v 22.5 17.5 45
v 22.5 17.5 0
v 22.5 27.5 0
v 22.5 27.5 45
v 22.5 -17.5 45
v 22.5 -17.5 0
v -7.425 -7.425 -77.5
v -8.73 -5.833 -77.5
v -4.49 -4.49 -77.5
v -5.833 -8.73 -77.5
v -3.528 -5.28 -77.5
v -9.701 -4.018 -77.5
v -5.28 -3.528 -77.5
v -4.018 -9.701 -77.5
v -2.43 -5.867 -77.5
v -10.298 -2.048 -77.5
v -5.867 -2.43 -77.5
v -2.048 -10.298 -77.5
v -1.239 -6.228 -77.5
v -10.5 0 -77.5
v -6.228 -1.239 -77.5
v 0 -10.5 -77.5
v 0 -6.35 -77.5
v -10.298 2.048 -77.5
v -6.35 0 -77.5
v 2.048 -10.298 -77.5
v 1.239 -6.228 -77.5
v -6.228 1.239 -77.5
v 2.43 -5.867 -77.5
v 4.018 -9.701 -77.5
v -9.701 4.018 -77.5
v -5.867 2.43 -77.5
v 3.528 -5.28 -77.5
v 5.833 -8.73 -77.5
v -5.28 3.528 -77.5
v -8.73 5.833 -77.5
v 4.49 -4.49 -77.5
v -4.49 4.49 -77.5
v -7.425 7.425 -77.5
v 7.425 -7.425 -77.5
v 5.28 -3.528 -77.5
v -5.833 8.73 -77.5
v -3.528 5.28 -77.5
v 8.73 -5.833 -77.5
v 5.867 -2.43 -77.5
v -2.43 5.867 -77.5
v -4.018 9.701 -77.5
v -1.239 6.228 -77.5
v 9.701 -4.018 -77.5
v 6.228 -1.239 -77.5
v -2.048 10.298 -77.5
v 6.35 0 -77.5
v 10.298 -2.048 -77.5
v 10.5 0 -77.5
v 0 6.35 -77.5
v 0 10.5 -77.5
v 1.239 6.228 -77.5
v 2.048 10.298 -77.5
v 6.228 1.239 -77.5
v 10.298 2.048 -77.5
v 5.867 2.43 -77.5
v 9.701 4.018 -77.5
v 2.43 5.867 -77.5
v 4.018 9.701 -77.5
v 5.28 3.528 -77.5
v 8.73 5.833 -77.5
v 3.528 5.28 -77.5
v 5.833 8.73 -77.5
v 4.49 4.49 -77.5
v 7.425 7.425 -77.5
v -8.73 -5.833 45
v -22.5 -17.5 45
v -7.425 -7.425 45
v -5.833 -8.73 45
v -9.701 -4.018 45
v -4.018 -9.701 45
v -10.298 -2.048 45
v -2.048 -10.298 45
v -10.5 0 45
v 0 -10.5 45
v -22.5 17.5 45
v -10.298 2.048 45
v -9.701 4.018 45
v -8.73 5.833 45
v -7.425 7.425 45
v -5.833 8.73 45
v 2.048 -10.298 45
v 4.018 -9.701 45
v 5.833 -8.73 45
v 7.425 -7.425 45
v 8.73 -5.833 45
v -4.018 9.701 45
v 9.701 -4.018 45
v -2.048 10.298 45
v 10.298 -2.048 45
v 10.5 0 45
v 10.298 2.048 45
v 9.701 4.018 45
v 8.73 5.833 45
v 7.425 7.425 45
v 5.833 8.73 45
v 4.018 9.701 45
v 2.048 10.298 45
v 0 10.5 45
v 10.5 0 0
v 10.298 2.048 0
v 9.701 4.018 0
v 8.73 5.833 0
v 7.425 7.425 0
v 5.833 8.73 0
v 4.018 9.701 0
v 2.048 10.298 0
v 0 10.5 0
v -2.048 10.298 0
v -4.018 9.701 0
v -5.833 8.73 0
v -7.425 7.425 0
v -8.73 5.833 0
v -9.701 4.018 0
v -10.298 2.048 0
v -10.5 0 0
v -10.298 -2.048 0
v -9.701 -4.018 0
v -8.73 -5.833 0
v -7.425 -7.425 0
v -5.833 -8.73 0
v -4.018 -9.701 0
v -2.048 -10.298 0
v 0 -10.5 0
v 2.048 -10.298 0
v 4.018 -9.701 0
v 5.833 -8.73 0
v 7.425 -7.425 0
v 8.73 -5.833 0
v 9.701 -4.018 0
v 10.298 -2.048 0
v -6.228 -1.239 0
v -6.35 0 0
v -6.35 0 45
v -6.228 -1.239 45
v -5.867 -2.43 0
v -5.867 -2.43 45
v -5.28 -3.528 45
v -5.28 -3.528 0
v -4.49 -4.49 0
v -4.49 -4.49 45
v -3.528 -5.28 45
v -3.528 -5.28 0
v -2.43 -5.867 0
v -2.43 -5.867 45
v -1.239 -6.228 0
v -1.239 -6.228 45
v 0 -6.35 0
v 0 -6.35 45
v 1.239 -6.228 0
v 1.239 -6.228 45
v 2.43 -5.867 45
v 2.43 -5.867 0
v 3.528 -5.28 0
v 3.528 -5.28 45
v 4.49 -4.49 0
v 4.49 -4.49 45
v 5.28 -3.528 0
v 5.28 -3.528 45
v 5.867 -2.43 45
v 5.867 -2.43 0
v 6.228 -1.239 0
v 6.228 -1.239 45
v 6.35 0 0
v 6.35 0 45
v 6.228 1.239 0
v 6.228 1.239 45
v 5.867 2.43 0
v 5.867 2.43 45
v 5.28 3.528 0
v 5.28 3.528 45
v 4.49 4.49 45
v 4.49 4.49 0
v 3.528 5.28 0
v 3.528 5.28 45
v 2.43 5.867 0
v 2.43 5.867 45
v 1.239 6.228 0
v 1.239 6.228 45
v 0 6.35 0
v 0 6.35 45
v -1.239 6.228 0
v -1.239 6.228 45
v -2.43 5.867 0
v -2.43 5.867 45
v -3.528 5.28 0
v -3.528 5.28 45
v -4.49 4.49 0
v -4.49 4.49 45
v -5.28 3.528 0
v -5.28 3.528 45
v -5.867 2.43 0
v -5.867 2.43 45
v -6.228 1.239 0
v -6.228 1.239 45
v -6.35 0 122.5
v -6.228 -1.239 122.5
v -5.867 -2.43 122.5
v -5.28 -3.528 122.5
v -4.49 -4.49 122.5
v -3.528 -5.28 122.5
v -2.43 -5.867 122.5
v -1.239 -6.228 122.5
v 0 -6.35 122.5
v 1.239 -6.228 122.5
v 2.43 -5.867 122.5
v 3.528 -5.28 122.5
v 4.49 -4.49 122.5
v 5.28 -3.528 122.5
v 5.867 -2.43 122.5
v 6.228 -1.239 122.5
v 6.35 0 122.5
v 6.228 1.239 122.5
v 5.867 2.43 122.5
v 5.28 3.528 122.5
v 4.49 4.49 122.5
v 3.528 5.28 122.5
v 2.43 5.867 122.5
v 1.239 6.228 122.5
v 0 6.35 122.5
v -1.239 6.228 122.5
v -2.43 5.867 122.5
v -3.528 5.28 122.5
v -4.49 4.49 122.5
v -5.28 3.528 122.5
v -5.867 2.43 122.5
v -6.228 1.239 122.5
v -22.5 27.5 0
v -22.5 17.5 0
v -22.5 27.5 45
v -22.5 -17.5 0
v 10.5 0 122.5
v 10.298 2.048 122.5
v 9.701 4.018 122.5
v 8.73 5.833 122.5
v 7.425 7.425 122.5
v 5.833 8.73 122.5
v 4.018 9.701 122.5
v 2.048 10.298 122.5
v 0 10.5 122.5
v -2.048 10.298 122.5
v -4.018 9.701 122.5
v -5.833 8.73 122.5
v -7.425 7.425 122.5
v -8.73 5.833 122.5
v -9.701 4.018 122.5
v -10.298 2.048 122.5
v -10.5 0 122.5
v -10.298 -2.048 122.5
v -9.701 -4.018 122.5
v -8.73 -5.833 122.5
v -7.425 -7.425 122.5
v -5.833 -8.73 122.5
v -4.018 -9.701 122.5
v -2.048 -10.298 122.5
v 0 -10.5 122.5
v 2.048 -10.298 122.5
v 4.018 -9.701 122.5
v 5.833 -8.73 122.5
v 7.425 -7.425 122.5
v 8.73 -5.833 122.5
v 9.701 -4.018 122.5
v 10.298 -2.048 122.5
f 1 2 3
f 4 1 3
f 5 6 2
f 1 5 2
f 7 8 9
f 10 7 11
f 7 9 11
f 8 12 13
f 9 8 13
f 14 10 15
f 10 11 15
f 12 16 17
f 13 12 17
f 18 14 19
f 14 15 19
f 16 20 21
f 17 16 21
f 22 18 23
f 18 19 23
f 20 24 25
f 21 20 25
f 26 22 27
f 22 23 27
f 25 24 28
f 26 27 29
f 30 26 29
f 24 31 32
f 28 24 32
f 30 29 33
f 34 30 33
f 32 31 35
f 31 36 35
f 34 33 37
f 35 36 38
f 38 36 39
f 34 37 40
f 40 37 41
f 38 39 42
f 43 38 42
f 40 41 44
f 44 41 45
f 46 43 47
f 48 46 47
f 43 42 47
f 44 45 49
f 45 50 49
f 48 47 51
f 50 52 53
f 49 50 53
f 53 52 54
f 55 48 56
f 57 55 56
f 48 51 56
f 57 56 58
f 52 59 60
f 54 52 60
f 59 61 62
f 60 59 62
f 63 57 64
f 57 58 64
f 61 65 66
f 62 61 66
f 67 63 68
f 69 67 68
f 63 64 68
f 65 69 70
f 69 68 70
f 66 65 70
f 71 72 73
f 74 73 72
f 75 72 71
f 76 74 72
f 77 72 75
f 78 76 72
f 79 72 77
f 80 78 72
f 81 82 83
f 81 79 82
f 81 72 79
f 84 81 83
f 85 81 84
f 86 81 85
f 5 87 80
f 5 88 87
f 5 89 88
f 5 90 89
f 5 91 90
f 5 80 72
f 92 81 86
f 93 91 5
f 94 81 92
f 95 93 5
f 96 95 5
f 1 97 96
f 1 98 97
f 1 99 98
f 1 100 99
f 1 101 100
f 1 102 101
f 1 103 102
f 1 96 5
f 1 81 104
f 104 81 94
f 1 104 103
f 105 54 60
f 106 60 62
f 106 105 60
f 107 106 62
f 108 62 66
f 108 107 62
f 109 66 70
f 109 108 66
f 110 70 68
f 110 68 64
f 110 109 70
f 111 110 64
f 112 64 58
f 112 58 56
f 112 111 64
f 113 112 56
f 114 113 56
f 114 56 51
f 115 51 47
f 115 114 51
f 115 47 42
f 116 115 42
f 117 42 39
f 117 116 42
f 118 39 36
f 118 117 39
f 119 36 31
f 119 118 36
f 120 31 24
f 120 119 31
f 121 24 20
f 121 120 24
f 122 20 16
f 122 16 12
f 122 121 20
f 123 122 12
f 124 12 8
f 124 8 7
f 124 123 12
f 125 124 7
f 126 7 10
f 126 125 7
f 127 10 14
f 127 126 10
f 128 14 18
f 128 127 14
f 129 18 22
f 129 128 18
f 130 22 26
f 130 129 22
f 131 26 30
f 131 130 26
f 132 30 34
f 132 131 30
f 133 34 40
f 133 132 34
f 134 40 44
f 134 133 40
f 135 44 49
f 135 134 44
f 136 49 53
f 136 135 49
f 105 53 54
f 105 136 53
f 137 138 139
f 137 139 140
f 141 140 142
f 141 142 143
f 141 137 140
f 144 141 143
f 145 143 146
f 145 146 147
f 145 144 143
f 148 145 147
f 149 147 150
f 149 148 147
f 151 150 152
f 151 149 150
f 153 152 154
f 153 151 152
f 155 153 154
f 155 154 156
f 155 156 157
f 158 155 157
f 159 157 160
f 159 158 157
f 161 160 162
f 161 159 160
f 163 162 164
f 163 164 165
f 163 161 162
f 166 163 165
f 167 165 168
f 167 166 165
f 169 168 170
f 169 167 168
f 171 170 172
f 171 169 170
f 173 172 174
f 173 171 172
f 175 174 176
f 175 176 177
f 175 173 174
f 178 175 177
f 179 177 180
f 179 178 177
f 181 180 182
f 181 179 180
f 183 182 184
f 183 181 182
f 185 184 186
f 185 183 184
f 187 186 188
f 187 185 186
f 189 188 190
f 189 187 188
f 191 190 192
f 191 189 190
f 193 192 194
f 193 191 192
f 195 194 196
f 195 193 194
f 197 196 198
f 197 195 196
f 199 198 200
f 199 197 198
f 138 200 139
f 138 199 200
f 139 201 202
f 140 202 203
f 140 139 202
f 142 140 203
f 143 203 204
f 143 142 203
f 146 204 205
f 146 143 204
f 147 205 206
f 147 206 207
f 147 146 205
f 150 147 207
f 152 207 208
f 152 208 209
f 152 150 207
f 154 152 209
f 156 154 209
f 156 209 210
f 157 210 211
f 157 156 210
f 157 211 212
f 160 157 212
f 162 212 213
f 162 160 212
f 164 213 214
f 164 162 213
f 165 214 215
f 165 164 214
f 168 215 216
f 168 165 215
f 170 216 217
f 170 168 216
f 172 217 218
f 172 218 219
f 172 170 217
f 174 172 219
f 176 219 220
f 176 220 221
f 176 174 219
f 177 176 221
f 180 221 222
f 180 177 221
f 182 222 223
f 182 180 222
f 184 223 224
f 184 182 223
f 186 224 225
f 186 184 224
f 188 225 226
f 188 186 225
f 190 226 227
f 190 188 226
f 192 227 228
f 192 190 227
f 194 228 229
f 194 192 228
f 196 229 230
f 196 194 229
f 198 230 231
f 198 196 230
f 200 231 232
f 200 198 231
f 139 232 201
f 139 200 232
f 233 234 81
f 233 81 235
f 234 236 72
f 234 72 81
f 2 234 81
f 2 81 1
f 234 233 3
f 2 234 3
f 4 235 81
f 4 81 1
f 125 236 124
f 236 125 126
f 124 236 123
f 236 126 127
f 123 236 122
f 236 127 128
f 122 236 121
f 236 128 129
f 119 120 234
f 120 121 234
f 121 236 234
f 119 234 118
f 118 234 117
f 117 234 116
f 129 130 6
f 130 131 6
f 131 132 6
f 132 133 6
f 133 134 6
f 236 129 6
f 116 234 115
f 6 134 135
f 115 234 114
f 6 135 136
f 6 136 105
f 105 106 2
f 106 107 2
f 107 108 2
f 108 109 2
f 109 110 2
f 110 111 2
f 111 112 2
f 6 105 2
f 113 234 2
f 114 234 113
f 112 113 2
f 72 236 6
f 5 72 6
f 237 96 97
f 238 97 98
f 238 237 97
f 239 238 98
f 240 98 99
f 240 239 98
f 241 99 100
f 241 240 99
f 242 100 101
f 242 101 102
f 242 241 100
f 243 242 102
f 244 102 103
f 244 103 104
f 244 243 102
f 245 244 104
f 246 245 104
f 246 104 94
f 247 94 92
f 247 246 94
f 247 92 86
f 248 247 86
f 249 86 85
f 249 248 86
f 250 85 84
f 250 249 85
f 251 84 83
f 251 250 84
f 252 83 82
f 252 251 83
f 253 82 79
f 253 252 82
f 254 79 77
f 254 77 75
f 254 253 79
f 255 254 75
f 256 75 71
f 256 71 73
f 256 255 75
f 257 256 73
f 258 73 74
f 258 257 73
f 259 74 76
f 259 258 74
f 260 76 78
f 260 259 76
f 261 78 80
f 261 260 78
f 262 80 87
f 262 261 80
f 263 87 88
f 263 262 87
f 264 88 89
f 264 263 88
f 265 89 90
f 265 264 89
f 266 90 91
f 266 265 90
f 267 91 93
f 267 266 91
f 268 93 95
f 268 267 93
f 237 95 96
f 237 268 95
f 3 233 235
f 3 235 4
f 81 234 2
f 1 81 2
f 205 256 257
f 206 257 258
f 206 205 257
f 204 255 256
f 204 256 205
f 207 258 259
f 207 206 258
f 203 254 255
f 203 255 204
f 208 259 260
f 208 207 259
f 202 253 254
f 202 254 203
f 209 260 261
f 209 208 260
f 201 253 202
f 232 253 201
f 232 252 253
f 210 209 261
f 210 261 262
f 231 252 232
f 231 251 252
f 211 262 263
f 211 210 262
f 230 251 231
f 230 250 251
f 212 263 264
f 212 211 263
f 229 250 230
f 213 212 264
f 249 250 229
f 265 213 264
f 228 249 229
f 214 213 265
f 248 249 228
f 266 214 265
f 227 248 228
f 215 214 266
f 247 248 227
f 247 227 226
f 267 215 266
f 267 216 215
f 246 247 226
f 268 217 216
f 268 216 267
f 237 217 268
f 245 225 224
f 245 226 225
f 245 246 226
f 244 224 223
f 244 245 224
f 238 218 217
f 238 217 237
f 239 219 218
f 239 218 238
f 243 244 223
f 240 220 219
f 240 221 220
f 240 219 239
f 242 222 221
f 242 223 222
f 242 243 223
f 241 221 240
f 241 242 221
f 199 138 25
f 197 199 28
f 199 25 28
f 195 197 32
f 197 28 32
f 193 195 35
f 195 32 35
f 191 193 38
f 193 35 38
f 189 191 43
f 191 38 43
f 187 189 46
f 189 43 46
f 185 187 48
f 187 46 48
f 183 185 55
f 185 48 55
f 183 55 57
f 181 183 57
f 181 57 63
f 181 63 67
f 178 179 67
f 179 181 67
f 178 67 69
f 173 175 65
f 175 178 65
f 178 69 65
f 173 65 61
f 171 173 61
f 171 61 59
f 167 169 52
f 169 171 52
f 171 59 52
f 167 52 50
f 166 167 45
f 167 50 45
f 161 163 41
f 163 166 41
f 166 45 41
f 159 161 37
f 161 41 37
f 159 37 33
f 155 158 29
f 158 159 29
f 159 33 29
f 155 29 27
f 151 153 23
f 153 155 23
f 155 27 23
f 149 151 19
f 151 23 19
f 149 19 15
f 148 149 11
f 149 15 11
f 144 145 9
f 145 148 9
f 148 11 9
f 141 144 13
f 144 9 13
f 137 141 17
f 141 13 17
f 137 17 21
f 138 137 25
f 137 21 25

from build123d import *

# Parameters (mm, degrees)
SKETCH2_W           = 45
SKETCH2_H           = 35
BOSS_EXTRUDE1_DEPTH = 45
SKETCH2_4_W         = 45
SKETCH2_4_H         = 10
BOSS_EXTRUDE3_DEPTH = 45
SKETCH3_R           = 6.35
CUT_EXTRUDE2_DEPTH  = 45
SKETCH5_R           = 10.5
BOSS_EXTRUDE4_DEPTH = 77.5
CUT_EXTRUDE4_START  = 77.5
SKETCH7_R           = 6.35
CUT_EXTRUDE4_DEPTH  = 77.5
BOSS_EXTRUDE5_START = 77.5
SKETCH8_R           = 10.5
BOSS_EXTRUDE5_DEPTH = 77.5
CUT_EXTRUDE5_START  = -77.5
SKETCH9_R           = 6.35
CUT_EXTRUDE5_DEPTH  = 77.5


with BuildPart() as part:
    # Sketch2 → Boss-Extrude1 (new body)
    with BuildSketch(Plane.XY):
        Rectangle(SKETCH2_W, SKETCH2_H)
    extrude(amount=BOSS_EXTRUDE1_DEPTH)

    # Sketch3 → Cut-Extrude2 (cut)
    with BuildSketch(Plane.XY):
        with Locations(Location((0, 0, 0), (0, 0, 180))):
            Circle(SKETCH3_R)
    extrude(amount=CUT_EXTRUDE2_DEPTH, mode=Mode.SUBTRACT)

    # Sketch5 → Boss-Extrude4 (add)
    with BuildSketch(Plane.XY):
        Circle(SKETCH5_R)
    extrude(amount=-BOSS_EXTRUDE4_DEPTH)

    # Sketch7 → Cut-Extrude4 (cut)
    with BuildSketch(Plane(origin=(0, 0, 0), x_dir=(-1, 0, 0), z_dir=(0, 0, -1)).offset(CUT_EXTRUDE4_START)):
        Circle(SKETCH7_R)
    extrude(amount=-CUT_EXTRUDE4_DEPTH, mode=Mode.SUBTRACT)

    # Sketch8 → Boss-Extrude5 (add)
    with BuildSketch(Plane.XY.offset(45).offset(BOSS_EXTRUDE5_START)):
        Circle(SKETCH8_R)
    extrude(amount=-BOSS_EXTRUDE5_DEPTH)

    # Sketch9 → Cut-Extrude5 (cut)
    with BuildSketch(Plane.XY.offset(122.5).offset(CUT_EXTRUDE5_START)):
        with Locations(Location((0, 0, 0), (0, 0, 180))):
            Circle(SKETCH9_R)
    extrude(amount=CUT_EXTRUDE5_DEPTH, mode=Mode.SUBTRACT)


with BuildPart() as body_2:
    # Sketch2<4> → Boss-Extrude3 (new body)
    with BuildSketch(Plane.XY):
        with Locations((0, 22.5)):
            Rectangle(SKETCH2_4_W, SKETCH2_4_H)
    extrude(amount=BOSS_EXTRUDE3_DEPTH)


solid = Compound([part.part, body_2.part])
